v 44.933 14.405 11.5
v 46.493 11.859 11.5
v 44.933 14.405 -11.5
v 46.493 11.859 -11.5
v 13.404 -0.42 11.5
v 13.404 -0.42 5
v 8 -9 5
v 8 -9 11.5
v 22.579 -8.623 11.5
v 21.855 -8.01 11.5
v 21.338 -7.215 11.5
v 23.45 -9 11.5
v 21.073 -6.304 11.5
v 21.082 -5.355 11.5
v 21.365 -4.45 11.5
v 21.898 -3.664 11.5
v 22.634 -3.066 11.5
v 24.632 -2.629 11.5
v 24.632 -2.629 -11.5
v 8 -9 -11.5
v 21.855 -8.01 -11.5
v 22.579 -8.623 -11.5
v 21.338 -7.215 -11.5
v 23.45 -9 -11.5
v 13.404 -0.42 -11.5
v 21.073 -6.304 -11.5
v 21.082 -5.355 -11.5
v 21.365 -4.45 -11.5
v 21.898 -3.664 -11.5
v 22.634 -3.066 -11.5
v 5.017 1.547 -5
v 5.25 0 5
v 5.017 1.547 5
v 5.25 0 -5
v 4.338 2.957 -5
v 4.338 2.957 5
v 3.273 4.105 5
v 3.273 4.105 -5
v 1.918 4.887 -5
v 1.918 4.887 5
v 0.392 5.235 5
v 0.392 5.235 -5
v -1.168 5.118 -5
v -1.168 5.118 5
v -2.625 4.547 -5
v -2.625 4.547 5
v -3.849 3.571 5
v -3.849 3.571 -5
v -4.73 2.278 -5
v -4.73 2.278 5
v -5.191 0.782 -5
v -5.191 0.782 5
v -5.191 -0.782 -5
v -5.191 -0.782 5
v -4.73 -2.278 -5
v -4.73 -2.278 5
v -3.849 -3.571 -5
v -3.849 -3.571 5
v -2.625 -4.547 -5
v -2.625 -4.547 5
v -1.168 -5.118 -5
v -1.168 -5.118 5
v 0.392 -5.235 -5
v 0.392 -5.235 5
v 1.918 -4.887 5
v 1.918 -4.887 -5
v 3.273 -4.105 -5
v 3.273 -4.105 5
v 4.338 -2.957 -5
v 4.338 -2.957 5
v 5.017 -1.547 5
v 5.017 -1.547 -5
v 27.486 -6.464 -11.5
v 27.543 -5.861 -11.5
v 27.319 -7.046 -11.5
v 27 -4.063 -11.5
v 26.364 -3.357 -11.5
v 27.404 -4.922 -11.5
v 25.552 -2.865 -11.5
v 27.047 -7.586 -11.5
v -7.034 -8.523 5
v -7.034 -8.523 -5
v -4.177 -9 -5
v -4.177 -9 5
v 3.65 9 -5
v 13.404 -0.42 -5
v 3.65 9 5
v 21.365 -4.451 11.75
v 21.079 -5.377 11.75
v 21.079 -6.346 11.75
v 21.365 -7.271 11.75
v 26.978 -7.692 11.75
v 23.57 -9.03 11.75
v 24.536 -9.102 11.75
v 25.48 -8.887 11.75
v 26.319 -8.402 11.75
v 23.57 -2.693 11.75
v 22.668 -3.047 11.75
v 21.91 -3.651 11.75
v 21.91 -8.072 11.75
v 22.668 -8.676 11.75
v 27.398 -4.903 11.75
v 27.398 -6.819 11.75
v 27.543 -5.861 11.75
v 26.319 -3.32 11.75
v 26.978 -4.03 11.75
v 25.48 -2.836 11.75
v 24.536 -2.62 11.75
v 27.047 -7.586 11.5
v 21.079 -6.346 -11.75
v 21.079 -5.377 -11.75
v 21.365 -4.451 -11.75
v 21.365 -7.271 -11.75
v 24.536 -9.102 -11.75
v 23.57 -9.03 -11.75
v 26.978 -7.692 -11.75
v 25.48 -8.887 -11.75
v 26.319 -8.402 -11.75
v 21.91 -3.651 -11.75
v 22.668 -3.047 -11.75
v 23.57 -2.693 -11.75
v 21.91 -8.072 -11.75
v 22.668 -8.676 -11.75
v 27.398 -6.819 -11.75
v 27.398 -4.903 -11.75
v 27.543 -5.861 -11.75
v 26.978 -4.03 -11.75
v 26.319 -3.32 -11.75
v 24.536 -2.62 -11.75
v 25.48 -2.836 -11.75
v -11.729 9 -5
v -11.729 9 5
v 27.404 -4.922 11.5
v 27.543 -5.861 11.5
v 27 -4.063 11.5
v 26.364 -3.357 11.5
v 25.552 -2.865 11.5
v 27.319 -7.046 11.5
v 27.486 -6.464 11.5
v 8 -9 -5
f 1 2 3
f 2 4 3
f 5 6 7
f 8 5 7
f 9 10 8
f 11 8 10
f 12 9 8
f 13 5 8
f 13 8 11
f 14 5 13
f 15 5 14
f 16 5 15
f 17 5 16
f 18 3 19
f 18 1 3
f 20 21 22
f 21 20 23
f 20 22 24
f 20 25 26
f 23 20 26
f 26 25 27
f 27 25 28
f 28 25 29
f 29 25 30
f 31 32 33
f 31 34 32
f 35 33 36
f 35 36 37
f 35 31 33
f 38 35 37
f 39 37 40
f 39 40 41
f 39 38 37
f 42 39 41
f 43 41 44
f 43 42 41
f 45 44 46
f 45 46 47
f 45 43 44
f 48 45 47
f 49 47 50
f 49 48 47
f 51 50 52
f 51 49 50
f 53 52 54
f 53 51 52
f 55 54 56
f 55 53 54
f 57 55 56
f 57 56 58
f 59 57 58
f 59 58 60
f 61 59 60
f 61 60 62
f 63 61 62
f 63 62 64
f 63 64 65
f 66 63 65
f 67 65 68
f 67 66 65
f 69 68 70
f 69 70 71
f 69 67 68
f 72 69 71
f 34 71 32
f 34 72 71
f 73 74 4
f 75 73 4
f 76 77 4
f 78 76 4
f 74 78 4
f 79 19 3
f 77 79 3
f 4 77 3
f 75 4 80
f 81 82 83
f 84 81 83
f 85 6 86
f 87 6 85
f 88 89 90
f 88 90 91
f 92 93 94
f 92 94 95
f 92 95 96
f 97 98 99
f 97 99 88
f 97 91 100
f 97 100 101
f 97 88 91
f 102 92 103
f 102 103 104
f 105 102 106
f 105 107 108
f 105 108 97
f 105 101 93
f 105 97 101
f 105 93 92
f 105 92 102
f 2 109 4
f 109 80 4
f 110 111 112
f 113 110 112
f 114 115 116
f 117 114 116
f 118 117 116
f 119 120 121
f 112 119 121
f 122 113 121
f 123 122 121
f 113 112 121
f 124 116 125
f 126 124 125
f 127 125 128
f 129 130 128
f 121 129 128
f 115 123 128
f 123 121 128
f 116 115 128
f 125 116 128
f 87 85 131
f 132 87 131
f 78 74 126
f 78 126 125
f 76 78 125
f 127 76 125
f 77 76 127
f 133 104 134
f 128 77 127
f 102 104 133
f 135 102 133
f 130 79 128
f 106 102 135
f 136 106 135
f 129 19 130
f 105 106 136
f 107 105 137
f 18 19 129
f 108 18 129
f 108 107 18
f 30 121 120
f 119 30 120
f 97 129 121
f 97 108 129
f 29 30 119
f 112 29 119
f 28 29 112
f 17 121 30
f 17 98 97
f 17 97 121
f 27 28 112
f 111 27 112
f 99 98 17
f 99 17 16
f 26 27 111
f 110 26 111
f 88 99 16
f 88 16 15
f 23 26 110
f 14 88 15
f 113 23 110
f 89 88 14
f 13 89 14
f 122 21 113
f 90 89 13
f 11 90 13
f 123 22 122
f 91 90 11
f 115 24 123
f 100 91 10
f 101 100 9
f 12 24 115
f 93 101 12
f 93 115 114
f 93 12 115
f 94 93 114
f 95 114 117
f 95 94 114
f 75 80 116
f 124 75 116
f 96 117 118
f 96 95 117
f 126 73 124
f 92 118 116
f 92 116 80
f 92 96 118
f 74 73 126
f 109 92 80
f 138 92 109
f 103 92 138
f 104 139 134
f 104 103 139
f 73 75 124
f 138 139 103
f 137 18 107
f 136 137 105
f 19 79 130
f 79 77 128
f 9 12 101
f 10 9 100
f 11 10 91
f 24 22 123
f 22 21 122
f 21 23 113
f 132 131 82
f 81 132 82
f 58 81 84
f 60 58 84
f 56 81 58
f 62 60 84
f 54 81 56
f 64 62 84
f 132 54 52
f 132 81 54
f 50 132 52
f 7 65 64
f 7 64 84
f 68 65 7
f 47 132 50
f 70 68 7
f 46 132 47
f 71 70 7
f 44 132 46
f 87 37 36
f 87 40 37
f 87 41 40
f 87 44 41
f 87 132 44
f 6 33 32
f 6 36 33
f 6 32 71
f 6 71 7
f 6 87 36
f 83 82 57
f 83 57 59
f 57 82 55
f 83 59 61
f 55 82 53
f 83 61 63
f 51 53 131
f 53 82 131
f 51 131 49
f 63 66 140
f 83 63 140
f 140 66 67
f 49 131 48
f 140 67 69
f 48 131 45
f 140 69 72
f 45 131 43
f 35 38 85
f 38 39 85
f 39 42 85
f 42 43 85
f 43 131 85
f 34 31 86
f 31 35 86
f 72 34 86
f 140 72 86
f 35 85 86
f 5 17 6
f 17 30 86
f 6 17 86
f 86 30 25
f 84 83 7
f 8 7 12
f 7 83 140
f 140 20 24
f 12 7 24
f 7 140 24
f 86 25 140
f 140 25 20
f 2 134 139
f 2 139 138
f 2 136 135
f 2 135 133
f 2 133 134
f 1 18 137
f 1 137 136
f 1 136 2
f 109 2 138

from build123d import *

# Parameters (mm, degrees)
SKETCH2_R           = 5.25
BOSS_EXTRUDE1_DEPTH = 5
BOSS_EXTRUDE2_DEPTH = 11.5
BOSS_EXTRUDE3_DEPTH = 11.75
CUT_EXTRUDE1_DEPTH  = 10
BOSS_EXTRUDE4_DEPTH = 10


with BuildPart() as part:
    # Sketch2 → Boss-Extrude1 (new, symmetric)
    with BuildSketch(Plane.XY):
        Polygon((3.65, 9), (-9, 9), (-9, -9), (8, -9), (13.404247693, -0.419567503), align=None)
        Circle(SKETCH2_R, mode=Mode.SUBTRACT)
    extrude(amount=BOSS_EXTRUDE1_DEPTH, both=True)

    # Sketch2<15> → Boss-Extrude2 (add, symmetric)
    with BuildSketch(Plane.XY):
        with BuildLine():
            Line((13.404247693, -0.419567503), (8, -9))
            Line((8, -9), (23.45, -9))
            ThreePointArc((23.45, -9), (21.073071329, -6.303811499), (22.634247693, -3.066227414))
            Line((22.634247693, -3.066227414), (13.404247693, -0.419567503))
        make_face()
        with BuildLine():
            ThreePointArc((24.632481869, -2.628978571), (27.214625143, -4.438023244), (27.047099939, -7.586362779))
            Line((27.047099939, -7.586362779), (46.492536422, 11.859073704))
            Line((46.492536422, 11.859073704), (44.932659612, 14.404893086))
            Line((44.932659612, 14.404893086), (24.632481869, -2.628978571))
        make_face()
    extrude(amount=BOSS_EXTRUDE2_DEPTH, both=True)


with BuildPart() as boss_extrude2_piece_1:
    # of the separate pieces the step leaves, piece 1, a body of its own (boss_extrude2_pieces)
    add(part.part.solids().sort_by_distance((22.634247693, -3.066227414, -11.5))[0])



with BuildPart() as boss_extrude2_piece_2:
    # of the separate pieces the step leaves, piece 2, a body of its own (boss_extrude2_pieces)
    add(part.part.solids().sort_by_distance((24.632481869, -2.628978571, -11.5))[0])


with BuildPart() as boss_extrude2_piece_1_1:
    add(boss_extrude2_piece_1.part)

    add(boss_extrude2_piece_2.part)  # Boss-Extrude3 merges Boss-Extrude2 piece 2
    # Sketch2<16> → Boss-Extrude3 (add, symmetric)
    with BuildSketch(Plane.XY):
        with BuildLine():
            ThreePointArc((22.634247693, -3.066227414), (21.073071329, -6.303811499), (23.45, -9))
            ThreePointArc((23.45, -9), (25.48151566, -8.885979074), (27.047099939, -7.586362779))
            ThreePointArc((27.047099939, -7.586362779), (27.416408735, -6.7586698), (27.542787913, -5.861177206))
            ThreePointArc((27.542787913, -5.861177206), (26.708000673, -3.686493937), (24.632481869, -2.628978571))
            ThreePointArc((24.632481869, -2.628978571), (23.598068182, -2.686296972), (22.634247693, -3.066227414))
        make_face()
    extrude(amount=BOSS_EXTRUDE3_DEPTH, both=True)

    # Sketch3 → Cut-Extrude1 (cut)
    with BuildSketch(Plane(origin=(0, 0, -5), x_dir=(-1, 0, 0), z_dir=(0, 0, -1))):
        Polygon((9, 9), (9, -9), (4.176914536, -9), align=None)
    extrude(amount=-CUT_EXTRUDE1_DEPTH, mode=Mode.SUBTRACT)

    # Sketch4 → Boss-Extrude4 (add)
    with BuildSketch(Plane(origin=(0, 0, -5), x_dir=(-1, 0, 0), z_dir=(0, 0, -1))):
        Polygon((9, 9), (11.729028356, 9), (7.033855882, -8.522622223), (4.176914536, -9), align=None)
    extrude(amount=-BOSS_EXTRUDE4_DEPTH)


solid = boss_extrude2_piece_1_1.part
